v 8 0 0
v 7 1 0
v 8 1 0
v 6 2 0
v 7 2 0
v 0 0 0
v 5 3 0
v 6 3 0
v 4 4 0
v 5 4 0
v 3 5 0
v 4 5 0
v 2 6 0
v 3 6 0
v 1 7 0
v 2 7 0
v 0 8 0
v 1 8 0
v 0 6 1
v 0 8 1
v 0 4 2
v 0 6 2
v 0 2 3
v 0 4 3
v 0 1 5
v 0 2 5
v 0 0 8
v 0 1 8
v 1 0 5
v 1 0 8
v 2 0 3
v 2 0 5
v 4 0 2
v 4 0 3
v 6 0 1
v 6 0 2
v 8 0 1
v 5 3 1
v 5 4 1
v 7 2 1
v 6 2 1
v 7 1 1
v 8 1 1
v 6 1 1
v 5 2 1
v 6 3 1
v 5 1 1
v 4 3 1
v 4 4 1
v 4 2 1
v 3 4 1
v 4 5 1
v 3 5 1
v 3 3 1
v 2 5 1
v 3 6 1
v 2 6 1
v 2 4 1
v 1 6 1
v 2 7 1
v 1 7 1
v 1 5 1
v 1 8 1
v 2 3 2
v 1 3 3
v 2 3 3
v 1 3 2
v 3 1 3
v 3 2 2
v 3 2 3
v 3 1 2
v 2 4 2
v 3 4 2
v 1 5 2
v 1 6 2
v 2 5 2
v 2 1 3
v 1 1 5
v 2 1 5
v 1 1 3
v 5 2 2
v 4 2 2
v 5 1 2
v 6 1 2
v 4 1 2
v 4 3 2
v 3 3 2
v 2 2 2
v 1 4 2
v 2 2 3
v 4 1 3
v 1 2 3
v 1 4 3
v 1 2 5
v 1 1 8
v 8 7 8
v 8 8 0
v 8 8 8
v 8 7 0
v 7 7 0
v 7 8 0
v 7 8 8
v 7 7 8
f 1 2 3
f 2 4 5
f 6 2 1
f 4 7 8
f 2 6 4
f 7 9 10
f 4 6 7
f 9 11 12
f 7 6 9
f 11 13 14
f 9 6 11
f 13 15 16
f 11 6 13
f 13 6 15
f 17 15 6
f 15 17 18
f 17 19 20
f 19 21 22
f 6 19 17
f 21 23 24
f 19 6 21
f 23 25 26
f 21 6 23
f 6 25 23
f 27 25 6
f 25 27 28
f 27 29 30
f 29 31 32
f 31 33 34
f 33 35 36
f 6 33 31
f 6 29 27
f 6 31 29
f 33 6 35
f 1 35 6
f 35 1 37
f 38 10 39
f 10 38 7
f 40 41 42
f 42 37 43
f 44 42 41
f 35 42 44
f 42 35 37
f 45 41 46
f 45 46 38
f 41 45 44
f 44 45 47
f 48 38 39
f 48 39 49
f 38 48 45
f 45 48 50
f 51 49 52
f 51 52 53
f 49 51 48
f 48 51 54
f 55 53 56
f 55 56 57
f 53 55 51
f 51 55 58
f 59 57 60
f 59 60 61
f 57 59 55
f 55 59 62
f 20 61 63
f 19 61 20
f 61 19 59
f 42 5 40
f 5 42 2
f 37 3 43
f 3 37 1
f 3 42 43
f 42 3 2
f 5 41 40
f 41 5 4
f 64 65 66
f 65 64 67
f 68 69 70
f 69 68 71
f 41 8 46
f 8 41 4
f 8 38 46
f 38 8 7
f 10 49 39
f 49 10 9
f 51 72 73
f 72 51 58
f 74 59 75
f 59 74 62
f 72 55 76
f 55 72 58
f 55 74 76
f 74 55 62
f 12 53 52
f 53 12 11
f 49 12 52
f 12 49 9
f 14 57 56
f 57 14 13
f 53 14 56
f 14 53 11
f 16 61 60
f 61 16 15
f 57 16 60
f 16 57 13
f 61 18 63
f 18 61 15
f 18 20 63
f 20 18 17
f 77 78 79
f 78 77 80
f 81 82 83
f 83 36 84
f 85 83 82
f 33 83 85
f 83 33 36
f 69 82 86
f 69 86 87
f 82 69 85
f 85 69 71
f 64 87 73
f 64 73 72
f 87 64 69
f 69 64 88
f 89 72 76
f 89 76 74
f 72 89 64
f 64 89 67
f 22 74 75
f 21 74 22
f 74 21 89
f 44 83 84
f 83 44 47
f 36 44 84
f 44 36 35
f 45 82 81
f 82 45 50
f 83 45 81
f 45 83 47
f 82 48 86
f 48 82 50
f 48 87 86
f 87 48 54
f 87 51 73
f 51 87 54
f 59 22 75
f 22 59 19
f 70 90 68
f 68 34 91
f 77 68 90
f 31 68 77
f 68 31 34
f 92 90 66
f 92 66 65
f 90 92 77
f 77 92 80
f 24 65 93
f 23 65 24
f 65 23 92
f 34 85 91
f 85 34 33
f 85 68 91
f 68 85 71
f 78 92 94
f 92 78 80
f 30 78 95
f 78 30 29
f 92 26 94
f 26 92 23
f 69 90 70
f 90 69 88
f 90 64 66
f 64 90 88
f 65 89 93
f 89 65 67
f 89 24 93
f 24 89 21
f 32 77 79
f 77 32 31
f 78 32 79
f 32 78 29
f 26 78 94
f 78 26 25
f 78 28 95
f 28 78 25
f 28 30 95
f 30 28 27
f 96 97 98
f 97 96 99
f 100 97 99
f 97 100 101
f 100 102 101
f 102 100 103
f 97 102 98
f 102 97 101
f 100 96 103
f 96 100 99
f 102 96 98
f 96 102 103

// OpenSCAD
union() {
    translate([0.0, 0.0, 0.0]) cube([1, 1, 1]);
    translate([1.0, 0.0, 0.0]) cube([1, 1, 1]);
    translate([2.0, 0.0, 0.0]) cube([1, 1, 1]);
    translate([3.0, 0.0, 0.0]) cube([1, 1, 1]);
    translate([4.0, 0.0, 0.0]) cube([1, 1, 1]);
    translate([5.0, 0.0, 0.0]) cube([1, 1, 1]);
    translate([6.0, 0.0, 0.0]) cube([1, 1, 1]);
    translate([7.0, 0.0, 0.0]) cube([1, 1, 1]);
    translate([0.0, 1.0, 0.0]) cube([1, 1, 1]);
    translate([1.0, 1.0, 0.0]) cube([1, 1, 1]);
    translate([2.0, 1.0, 0.0]) cube([1, 1, 1]);
    translate([3.0, 1.0, 0.0]) cube([1, 1, 1]);
    translate([4.0, 1.0, 0.0]) cube([1, 1, 1]);
    translate([5.0, 1.0, 0.0]) cube([1, 1, 1]);
    translate([6.0, 1.0, 0.0]) cube([1, 1, 1]);
    translate([0.0, 2.0, 0.0]) cube([1, 1, 1]);
    translate([1.0, 2.0, 0.0]) cube([1, 1, 1]);
    translate([2.0, 2.0, 0.0]) cube([1, 1, 1]);
    translate([3.0, 2.0, 0.0]) cube([1, 1, 1]);
    translate([4.0, 2.0, 0.0]) cube([1, 1, 1]);
    translate([5.0, 2.0, 0.0]) cube([1, 1, 1]);
    translate([0.0, 3.0, 0.0]) cube([1, 1, 1]);
    translate([1.0, 3.0, 0.0]) cube([1, 1, 1]);
    translate([2.0, 3.0, 0.0]) cube([1, 1, 1]);
    translate([3.0, 3.0, 0.0]) cube([1, 1, 1]);
    translate([4.0, 3.0, 0.0]) cube([1, 1, 1]);
    translate([0.0, 4.0, 0.0]) cube([1, 1, 1]);
    translate([1.0, 4.0, 0.0]) cube([1, 1, 1]);
    translate([2.0, 4.0, 0.0]) cube([1, 1, 1]);
    translate([3.0, 4.0, 0.0]) cube([1, 1, 1]);
    translate([0.0, 5.0, 0.0]) cube([1, 1, 1]);
    translate([1.0, 5.0, 0.0]) cube([1, 1, 1]);
    translate([2.0, 5.0, 0.0]) cube([1, 1, 1]);
    translate([0.0, 6.0, 0.0]) cube([1, 1, 1]);
    translate([1.0, 6.0, 0.0]) cube([1, 1, 1]);
    translate([0.0, 7.0, 0.0]) cube([1, 1, 1]);
    translate([0.0, 0.0, 1.0]) cube([1, 1, 1]);
    translate([1.0, 0.0, 1.0]) cube([1, 1, 1]);
    translate([2.0, 0.0, 1.0]) cube([1, 1, 1]);
    translate([3.0, 0.0, 1.0]) cube([1, 1, 1]);
    translate([4.0, 0.0, 1.0]) cube([1, 1, 1]);
    translate([5.0, 0.0, 1.0]) cube([1, 1, 1]);
    translate([0.0, 1.0, 1.0]) cube([1, 1, 1]);
    translate([1.0, 1.0, 1.0]) cube([1, 1, 1]);
    translate([2.0, 1.0, 1.0]) cube([1, 1, 1]);
    translate([3.0, 1.0, 1.0]) cube([1, 1, 1]);
    translate([4.0, 1.0, 1.0]) cube([1, 1, 1]);
    translate([0.0, 2.0, 1.0]) cube([1, 1, 1]);
    translate([1.0, 2.0, 1.0]) cube([1, 1, 1]);
    translate([2.0, 2.0, 1.0]) cube([1, 1, 1]);
    translate([3.0, 2.0, 1.0]) cube([1, 1, 1]);
    translate([0.0, 3.0, 1.0]) cube([1, 1, 1]);
    translate([1.0, 3.0, 1.0]) cube([1, 1, 1]);
    translate([2.0, 3.0, 1.0]) cube([1, 1, 1]);
    translate([0.0, 4.0, 1.0]) cube([1, 1, 1]);
    translate([1.0, 4.0, 1.0]) cube([1, 1, 1]);
    translate([0.0, 5.0, 1.0]) cube([1, 1, 1]);
    translate([0.0, 0.0, 2.0]) cube([1, 1, 1]);
    translate([1.0, 0.0, 2.0]) cube([1, 1, 1]);
    translate([2.0, 0.0, 2.0]) cube([1, 1, 1]);
    translate([3.0, 0.0, 2.0]) cube([1, 1, 1]);
    translate([0.0, 1.0, 2.0]) cube([1, 1, 1]);
    translate([1.0, 1.0, 2.0]) cube([1, 1, 1]);
    translate([2.0, 1.0, 2.0]) cube([1, 1, 1]);
    translate([0.0, 2.0, 2.0]) cube([1, 1, 1]);
    translate([1.0, 2.0, 2.0]) cube([1, 1, 1]);
    translate([0.0, 3.0, 2.0]) cube([1, 1, 1]);
    translate([0.0, 0.0, 3.0]) cube([1, 1, 1]);
    translate([1.0, 0.0, 3.0]) cube([1, 1, 1]);
    translate([0.0, 1.0, 3.0]) cube([1, 1, 1]);
    translate([0.0, 0.0, 4.0]) cube([1, 1, 1]);
    translate([1.0, 0.0, 4.0]) cube([1, 1, 1]);
    translate([0.0, 1.0, 4.0]) cube([1, 1, 1]);
    translate([0.0, 0.0, 5.0]) cube([1, 1, 1]);
    translate([0.0, 0.0, 6.0]) cube([1, 1, 1]);
    translate([0.0, 0.0, 7.0]) cube([1, 1, 1]);
    translate([7.0, 7.0, 0.0]) cube([1, 1, 1]);
    translate([7.0, 7.0, 1.0]) cube([1, 1, 1]);
    translate([7.0, 7.0, 2.0]) cube([1, 1, 1]);
    translate([7.0, 7.0, 3.0]) cube([1, 1, 1]);
    translate([7.0, 7.0, 4.0]) cube([1, 1, 1]);
    translate([7.0, 7.0, 5.0]) cube([1, 1, 1]);
    translate([7.0, 7.0, 6.0]) cube([1, 1, 1]);
    translate([7.0, 7.0, 7.0]) cube([1, 1, 1]);
}
